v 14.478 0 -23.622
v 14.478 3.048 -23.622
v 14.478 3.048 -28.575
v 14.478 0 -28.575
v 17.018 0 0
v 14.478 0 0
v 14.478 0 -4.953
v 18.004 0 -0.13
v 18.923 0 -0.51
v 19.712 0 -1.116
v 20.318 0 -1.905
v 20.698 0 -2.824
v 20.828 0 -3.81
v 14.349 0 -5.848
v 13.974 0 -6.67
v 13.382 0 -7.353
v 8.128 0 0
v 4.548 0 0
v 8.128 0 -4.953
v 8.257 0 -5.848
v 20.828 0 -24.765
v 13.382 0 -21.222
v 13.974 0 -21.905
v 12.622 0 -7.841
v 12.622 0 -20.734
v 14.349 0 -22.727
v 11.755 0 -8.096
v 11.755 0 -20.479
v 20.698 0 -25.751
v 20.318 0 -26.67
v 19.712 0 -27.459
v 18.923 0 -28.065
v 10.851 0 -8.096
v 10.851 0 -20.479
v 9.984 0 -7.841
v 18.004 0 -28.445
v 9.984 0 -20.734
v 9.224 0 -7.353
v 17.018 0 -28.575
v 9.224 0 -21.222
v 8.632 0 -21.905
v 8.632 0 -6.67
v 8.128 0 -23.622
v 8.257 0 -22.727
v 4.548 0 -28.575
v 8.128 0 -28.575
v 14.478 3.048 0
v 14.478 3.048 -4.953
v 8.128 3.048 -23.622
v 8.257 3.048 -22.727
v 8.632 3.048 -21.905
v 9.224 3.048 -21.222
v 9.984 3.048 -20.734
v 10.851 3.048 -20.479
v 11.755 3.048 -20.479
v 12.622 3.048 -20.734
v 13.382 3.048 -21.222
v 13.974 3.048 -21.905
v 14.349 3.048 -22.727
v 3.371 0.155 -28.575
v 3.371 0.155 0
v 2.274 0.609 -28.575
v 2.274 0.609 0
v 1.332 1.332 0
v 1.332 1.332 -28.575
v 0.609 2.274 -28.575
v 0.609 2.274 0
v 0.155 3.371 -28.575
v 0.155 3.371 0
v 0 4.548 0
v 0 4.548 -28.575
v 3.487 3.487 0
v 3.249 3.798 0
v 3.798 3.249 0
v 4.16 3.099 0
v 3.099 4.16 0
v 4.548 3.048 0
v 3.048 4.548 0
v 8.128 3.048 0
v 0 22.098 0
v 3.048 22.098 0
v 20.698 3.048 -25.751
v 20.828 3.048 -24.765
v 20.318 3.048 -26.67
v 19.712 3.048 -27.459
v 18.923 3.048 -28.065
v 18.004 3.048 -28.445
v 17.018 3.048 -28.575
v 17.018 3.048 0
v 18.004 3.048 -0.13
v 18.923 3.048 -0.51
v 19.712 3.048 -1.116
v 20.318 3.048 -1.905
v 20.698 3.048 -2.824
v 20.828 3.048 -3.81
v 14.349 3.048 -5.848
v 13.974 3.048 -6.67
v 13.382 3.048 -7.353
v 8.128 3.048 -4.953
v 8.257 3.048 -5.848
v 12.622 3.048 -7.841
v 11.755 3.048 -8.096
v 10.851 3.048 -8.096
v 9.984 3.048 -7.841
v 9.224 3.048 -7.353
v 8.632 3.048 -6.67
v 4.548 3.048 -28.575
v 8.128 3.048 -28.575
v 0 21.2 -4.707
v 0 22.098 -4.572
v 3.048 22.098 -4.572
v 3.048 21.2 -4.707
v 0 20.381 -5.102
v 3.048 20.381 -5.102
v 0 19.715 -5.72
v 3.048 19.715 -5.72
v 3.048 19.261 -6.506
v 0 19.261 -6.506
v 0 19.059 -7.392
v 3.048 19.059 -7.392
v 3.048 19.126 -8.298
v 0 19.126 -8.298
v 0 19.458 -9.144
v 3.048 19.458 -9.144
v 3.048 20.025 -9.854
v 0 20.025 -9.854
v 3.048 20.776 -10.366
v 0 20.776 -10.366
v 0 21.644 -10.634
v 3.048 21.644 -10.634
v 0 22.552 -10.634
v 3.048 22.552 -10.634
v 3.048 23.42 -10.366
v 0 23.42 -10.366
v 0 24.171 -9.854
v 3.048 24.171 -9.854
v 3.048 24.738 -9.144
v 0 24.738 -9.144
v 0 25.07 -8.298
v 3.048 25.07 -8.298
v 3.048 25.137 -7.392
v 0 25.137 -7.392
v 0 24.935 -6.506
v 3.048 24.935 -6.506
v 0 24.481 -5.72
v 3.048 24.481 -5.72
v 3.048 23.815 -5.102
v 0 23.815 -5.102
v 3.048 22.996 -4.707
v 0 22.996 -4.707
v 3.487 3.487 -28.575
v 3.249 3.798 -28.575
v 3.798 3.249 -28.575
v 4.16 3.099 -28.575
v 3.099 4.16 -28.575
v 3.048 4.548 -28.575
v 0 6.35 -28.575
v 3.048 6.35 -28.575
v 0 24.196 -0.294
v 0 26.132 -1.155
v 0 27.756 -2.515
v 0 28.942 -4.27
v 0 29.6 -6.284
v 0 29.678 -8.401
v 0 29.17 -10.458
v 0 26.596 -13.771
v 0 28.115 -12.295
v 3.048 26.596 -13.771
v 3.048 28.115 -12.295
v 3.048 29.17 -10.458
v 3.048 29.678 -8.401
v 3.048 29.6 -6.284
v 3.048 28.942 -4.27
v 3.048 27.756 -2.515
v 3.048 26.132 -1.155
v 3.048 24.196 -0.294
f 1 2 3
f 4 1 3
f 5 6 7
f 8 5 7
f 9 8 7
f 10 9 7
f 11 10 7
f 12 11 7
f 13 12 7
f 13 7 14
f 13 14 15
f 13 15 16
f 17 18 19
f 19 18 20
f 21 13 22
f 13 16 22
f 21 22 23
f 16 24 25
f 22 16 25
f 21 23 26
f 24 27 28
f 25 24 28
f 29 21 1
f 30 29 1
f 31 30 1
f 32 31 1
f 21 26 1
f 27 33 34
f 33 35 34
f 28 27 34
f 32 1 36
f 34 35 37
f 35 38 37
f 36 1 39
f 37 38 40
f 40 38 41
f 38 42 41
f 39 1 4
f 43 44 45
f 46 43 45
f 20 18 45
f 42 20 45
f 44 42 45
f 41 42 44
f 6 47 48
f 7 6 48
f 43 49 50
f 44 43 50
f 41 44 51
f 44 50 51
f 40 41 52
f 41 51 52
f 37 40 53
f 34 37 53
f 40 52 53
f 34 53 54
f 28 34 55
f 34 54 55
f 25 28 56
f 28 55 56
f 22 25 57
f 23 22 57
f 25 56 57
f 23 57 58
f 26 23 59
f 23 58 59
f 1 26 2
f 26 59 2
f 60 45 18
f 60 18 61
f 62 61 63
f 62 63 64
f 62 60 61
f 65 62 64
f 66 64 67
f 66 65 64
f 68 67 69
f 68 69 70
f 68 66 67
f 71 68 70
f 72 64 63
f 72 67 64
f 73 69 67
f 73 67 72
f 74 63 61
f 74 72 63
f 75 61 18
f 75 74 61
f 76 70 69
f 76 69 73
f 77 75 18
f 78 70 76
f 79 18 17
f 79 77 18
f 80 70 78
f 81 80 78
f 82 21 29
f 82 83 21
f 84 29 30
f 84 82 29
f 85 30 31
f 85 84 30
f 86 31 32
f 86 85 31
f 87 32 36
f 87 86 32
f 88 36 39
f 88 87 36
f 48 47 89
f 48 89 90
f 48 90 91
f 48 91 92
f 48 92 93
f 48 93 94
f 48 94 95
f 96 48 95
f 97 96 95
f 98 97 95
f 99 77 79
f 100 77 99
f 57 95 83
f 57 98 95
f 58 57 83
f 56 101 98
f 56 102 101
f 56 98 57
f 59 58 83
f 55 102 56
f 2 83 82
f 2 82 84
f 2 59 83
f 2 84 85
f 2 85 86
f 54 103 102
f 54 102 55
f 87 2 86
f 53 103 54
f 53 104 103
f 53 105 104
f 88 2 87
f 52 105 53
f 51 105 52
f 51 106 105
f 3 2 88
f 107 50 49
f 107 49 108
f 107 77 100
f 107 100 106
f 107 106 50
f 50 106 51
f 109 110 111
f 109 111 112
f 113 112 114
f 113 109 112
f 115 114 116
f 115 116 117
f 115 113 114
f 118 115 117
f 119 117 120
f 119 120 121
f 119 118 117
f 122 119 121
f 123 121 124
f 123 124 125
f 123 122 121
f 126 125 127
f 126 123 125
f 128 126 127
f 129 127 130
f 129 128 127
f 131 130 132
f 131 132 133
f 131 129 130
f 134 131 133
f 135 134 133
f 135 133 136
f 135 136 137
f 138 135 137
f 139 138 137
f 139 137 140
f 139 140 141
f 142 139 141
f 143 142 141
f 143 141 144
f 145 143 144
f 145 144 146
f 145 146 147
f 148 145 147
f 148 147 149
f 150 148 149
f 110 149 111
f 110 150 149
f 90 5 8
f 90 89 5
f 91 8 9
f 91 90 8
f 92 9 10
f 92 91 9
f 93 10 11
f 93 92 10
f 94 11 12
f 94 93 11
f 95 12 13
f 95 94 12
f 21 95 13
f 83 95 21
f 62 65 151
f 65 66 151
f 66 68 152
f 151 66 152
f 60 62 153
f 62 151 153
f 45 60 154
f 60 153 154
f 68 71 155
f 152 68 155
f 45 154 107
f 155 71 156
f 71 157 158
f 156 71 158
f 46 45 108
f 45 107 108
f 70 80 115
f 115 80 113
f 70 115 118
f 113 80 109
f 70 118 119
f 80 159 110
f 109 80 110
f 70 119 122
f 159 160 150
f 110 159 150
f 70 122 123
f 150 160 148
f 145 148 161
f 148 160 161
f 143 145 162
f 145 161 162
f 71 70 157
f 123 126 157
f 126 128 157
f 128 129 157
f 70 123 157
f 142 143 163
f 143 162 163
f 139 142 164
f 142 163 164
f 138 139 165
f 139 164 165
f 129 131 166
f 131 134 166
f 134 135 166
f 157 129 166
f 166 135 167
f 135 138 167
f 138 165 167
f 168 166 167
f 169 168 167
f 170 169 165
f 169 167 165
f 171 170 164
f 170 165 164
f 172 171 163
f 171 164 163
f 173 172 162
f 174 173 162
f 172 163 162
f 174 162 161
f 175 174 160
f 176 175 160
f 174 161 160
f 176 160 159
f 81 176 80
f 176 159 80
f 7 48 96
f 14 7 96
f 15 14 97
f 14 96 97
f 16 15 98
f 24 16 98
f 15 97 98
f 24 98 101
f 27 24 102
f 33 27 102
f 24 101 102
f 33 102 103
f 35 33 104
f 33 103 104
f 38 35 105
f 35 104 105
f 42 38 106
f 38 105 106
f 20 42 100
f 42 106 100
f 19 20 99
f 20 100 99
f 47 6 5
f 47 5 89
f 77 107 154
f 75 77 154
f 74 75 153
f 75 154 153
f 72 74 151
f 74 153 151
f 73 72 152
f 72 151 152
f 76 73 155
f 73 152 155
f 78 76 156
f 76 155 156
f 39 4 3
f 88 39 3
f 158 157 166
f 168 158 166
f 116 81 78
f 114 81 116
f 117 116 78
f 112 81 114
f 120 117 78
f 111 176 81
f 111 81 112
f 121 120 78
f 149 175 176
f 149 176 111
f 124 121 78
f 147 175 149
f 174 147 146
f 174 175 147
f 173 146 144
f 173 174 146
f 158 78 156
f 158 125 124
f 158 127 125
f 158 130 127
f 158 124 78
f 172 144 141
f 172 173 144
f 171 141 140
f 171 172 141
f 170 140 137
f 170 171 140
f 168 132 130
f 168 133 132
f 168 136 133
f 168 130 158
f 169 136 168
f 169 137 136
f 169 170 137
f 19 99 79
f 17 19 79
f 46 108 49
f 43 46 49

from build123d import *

# Parameters (mm, degrees)
SKETCH1_R              = 3.048
BOSS_EXTRUDE1_DEPTH    = 3.048
SKETCH2_W              = 28.575
SKETCH2_H              = 3.048
BOSS_EXTRUDE2_DEPTH    = 17.78
CUT_EXTRUDE1_DEPTH     = 45.290237175
FILLET1_R              = 3.81
CONVERT_SOLID1_START   = -28.575
CONVERT_SOLID1_DEPTH   = 28.575
CONVERT_SOLID1_2_DEPTH = 28.575


# Read off the part's stored shape, not the designer's step: Convert-Solid1
with BuildPart() as part:
    # Sketch1 → Boss-Extrude1 (new body)
    with BuildSketch(Plane(origin=(0, 0, 0), x_dir=(0, 0, -1), z_dir=(1, 0, 0))):
        with BuildLine():
            Line((28.575, 6.35), (13.771011503, 26.59571692))
            ThreePointArc((13.771011503, 26.59571692), (5.254234548, 29.341449028), (0, 22.098))
            Line((0, 22.098), (0, 0))
            Line((0, 0), (28.575, 0))
            Line((28.575, 0), (28.575, 6.35))
        make_face()
        with Locations(Location((7.62, 22.098, 0), (0, 0, 180))):
            Circle(SKETCH1_R, mode=Mode.SUBTRACT)
    extrude(amount=BOSS_EXTRUDE1_DEPTH)

    # Sketch2 → Boss-Extrude2 (add)
    with BuildSketch(Plane(origin=(3.048, 0, 0), x_dir=(0, 0, -1), z_dir=(1, 0, 0))):
        with Locations((14.2875, 1.524)):
            Rectangle(SKETCH2_W, SKETCH2_H)
    extrude(amount=BOSS_EXTRUDE2_DEPTH)

    # Sketch3 → Cut-Extrude1 (cut, through all)
    with BuildSketch(Plane(origin=(0, 3.048, 0), x_dir=(1, 0, 0), z_dir=(0, 1, 0))):
        with BuildLine():
            Line((8.128, 4.953), (8.128, 0))
            Line((8.128, 0), (14.478, 0))
            Line((14.478, 0), (14.478, 4.953))
            ThreePointArc((14.478, 4.953), (11.303, 8.128), (8.128, 4.953))
        make_face()
        with BuildLine():
            Line((8.128, 28.575), (8.128, 23.622))
            ThreePointArc((8.128, 23.622), (11.303, 20.447), (14.478, 23.622))
            Line((14.478, 23.622), (14.478, 28.575))
            Line((14.478, 28.575), (8.128, 28.575))
        make_face()
    extrude(amount=-CUT_EXTRUDE1_DEPTH, mode=Mode.SUBTRACT)

    # Fillet1
    fillet1_edges = [part.edges().sort_by_distance(p)[0] for p in [
        (20.828, 1.524, 0),
        (20.828, 1.524, -28.575),
    ]]
    fillet(fillet1_edges, radius=FILLET1_R)

    # Convert-Solid1 outline → Convert-Solid1 (cut)
    with BuildSketch(Plane.XY.offset(CONVERT_SOLID1_START)):
        with BuildLine():
            Line((0, 0), (4.548, 0))
            ThreePointArc((4.548, 0), (1.332078359, 1.332078359), (0, 4.548))
            Line((0, 4.548), (0, 0))
        make_face()
    extrude(amount=CONVERT_SOLID1_DEPTH, mode=Mode.SUBTRACT)

    # Convert-Solid1 2 outline → Convert-Solid1 2 (add)
    with BuildSketch(Plane.XY.offset(CONVERT_SOLID1_START)):
        with BuildLine():
            Line((3.048, 3.048), (4.548, 3.048))
            ThreePointArc((4.548, 3.048), (3.487339828, 3.487339828), (3.048, 4.548))
            Line((3.048, 4.548), (3.048, 3.048))
        make_face()
    extrude(amount=CONVERT_SOLID1_2_DEPTH)


solid = part.part
